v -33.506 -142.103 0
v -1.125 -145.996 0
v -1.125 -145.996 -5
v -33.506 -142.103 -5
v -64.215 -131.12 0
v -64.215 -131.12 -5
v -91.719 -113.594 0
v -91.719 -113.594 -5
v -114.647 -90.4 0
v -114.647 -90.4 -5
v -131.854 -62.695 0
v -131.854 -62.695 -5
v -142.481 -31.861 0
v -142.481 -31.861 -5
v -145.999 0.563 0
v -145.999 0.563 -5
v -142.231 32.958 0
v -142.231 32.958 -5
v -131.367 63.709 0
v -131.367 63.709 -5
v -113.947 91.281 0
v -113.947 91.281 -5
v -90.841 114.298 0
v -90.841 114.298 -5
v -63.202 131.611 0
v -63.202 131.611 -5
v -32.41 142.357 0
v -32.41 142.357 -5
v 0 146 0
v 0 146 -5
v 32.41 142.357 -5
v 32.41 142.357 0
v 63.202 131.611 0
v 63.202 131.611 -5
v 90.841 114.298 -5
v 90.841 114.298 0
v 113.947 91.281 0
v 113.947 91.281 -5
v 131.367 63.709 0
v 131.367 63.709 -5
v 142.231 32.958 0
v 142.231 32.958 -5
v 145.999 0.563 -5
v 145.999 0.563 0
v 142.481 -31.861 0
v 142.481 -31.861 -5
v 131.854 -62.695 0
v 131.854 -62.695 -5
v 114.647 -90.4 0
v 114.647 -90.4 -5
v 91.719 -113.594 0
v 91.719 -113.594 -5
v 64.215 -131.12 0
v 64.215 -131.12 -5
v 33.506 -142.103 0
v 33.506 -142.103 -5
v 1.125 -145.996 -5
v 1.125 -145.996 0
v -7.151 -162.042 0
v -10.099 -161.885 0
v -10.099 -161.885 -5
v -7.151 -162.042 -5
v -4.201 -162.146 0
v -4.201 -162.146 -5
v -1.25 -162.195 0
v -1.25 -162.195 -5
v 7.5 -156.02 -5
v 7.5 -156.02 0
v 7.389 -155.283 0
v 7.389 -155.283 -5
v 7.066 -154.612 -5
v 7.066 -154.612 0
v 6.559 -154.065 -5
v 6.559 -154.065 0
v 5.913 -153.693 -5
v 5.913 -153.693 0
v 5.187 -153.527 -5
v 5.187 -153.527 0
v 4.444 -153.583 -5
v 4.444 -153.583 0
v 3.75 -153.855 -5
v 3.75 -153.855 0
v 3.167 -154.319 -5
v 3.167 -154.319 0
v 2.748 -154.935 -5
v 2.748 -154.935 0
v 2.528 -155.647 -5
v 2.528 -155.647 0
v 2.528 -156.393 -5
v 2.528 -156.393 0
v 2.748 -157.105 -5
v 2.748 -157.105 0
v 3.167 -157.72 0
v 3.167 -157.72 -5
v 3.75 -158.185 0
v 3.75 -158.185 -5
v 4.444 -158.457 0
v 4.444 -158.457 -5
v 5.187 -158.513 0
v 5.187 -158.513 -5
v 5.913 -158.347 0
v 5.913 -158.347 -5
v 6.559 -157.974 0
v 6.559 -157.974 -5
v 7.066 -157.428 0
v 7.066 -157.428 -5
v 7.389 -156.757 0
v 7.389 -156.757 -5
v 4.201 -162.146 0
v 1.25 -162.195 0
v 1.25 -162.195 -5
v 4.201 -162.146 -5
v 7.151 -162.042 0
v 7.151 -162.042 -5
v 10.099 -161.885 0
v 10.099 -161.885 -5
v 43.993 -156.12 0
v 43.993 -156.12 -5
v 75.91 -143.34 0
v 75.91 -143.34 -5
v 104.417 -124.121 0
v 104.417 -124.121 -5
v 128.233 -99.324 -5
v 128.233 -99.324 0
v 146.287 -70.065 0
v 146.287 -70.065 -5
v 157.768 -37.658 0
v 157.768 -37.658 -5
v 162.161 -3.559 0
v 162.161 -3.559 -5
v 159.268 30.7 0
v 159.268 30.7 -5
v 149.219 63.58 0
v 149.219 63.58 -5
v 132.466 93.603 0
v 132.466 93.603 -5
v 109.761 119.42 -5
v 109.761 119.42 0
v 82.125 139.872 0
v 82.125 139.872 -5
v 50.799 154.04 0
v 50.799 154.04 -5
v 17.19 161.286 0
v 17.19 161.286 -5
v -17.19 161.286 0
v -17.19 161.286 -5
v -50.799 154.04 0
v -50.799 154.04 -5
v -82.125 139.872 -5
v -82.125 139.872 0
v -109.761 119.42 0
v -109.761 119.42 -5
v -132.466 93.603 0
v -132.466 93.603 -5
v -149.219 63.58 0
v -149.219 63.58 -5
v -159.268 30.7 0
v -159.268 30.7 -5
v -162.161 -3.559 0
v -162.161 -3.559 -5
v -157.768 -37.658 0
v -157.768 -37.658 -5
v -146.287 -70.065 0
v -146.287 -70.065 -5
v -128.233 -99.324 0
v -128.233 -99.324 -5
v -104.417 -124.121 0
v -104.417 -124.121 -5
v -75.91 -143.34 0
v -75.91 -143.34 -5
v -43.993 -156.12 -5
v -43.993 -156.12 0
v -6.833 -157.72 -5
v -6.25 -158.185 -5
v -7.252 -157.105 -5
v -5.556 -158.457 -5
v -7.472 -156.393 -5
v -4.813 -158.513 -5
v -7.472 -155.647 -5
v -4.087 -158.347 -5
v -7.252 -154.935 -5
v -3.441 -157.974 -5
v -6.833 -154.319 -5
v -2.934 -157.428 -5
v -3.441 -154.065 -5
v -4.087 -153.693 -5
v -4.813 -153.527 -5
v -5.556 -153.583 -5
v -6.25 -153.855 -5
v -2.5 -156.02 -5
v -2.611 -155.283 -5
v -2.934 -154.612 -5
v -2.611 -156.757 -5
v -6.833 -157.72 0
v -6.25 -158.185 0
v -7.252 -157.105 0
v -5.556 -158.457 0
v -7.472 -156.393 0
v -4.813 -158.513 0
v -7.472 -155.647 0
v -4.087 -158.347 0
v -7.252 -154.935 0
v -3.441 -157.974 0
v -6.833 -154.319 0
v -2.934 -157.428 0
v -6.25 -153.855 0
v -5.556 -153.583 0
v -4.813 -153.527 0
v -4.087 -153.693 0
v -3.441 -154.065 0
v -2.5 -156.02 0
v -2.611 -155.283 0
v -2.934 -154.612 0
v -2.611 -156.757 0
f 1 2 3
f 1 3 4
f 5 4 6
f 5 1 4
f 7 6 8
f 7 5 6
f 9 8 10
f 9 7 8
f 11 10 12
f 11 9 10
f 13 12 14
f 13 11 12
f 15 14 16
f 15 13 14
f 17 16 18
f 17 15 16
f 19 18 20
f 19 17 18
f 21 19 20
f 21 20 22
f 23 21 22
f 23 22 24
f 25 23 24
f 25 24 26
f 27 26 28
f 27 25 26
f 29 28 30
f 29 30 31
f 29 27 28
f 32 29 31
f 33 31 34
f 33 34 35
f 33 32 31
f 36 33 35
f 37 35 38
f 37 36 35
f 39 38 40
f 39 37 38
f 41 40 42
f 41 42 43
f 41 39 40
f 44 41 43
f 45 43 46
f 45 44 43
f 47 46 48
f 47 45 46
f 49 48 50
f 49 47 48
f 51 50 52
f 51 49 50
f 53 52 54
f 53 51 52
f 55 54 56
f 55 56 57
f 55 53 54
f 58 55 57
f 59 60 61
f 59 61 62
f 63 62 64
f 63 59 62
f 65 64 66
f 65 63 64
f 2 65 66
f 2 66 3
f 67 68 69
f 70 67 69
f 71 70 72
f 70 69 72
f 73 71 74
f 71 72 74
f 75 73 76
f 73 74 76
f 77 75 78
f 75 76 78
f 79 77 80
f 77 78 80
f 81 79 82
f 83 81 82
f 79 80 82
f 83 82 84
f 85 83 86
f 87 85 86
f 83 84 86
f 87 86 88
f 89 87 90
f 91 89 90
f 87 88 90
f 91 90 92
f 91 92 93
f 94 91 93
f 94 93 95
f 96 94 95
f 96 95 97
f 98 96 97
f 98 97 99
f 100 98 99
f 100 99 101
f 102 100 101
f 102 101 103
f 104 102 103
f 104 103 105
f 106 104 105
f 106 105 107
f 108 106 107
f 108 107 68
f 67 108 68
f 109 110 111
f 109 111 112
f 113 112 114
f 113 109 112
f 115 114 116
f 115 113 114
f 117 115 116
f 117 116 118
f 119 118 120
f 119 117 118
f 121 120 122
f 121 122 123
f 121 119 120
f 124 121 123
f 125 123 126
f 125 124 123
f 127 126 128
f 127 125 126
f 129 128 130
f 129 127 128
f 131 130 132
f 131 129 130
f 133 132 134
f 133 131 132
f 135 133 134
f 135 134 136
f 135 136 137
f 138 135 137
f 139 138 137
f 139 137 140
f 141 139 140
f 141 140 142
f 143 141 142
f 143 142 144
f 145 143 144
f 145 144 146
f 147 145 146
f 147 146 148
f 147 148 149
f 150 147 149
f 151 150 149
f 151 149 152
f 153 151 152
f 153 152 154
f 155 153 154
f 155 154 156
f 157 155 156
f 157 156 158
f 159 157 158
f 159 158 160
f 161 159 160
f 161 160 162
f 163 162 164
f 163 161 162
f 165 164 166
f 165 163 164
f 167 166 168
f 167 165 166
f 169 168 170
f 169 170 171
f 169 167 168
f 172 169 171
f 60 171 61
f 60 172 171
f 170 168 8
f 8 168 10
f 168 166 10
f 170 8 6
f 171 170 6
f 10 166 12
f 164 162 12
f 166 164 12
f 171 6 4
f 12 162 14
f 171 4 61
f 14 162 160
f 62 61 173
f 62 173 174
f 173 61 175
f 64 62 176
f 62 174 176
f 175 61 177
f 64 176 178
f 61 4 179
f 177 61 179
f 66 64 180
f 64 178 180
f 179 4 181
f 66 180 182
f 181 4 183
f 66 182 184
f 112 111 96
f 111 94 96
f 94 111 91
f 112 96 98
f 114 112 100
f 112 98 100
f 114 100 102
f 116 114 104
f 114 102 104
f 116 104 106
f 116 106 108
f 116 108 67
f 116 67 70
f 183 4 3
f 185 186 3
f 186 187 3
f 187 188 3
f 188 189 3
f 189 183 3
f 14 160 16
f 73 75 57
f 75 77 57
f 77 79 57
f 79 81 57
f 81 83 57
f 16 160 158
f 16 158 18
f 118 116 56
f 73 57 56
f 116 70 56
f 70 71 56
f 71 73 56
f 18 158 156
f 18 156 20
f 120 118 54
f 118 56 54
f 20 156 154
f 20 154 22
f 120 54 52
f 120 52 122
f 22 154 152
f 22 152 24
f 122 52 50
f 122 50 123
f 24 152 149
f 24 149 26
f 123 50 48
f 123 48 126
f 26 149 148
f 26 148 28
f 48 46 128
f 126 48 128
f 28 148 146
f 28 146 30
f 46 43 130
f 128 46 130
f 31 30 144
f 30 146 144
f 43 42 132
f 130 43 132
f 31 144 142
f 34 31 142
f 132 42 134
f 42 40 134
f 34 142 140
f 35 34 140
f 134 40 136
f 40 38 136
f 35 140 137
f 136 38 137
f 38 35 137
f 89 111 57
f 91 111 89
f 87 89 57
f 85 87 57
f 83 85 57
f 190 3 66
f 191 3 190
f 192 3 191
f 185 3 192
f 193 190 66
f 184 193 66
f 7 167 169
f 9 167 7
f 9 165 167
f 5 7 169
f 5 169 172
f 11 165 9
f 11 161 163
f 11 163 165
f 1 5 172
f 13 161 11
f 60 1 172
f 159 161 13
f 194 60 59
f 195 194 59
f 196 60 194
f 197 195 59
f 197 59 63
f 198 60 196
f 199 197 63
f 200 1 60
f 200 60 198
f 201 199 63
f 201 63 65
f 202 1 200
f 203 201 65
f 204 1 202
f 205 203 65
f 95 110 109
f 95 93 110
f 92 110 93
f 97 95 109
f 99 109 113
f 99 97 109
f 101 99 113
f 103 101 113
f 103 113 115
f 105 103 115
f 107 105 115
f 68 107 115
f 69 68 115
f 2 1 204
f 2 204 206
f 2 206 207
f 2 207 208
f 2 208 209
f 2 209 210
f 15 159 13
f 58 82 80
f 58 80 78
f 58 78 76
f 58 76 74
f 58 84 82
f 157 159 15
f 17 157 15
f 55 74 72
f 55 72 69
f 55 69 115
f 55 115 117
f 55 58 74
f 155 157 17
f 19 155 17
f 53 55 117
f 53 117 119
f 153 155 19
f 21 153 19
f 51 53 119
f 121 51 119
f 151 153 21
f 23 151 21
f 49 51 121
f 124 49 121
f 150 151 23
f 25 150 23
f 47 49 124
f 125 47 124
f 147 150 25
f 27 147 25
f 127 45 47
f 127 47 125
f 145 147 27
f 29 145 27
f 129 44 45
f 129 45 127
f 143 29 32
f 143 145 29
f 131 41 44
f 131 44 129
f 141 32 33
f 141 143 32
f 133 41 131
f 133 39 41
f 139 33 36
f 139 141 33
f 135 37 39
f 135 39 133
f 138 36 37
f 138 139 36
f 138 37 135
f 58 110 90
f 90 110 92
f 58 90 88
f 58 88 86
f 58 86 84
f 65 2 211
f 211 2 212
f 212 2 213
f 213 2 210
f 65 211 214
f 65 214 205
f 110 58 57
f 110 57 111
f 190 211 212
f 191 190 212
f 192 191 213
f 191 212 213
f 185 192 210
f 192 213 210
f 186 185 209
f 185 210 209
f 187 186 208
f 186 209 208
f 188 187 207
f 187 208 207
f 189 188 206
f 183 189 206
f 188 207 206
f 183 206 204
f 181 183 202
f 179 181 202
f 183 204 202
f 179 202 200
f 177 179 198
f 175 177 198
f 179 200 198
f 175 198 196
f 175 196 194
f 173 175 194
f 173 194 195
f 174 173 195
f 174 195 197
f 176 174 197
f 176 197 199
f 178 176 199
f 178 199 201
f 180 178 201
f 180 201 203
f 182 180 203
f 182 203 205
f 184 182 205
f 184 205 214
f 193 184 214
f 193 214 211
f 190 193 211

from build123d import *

# Parameters (mm, degrees)
BODYSKE_R   = 2.5
BODY_DEPTH  = 5
UNLUG_DEPTH = 5


with BuildPart() as part:
    # BodySke → Body (new body)
    with BuildSketch(Plane.XY):
        with BuildLine():
            Line((1.125154131, -145.995664416), (1.25, -162.195183344))
            ThreePointArc((1.25, -162.195183344), (5.676371918, -162.100644051), (10.098514589, -161.885329796))
            ThreePointArc((10.098514589, -161.885329796), (10.563651318, -161.684989651), (10.7954035, -161.23467945))
            Line((10.7954035, -161.23467945), (10.957598268, -160.002687876))
            ThreePointArc((10.957598268, -160.002687876), (13.335118636, -155.229150535), (18.145600866, -152.92729855))
            ThreePointArc((18.145600866, -152.92729855), (0, 162), (-18.145600866, -152.92729855))
            ThreePointArc((-18.145600866, -152.92729855), (-13.335118636, -155.229150535), (-10.957598268, -160.002687876))
            Line((-10.957598268, -160.002687876), (-10.7954035, -161.23467945))
            ThreePointArc((-10.7954035, -161.23467945), (-10.563651318, -161.684989651), (-10.098514589, -161.885329796))
            ThreePointArc((-10.098514589, -161.885329796), (-5.676371918, -162.100644051), (-1.25, -162.195183344))
            Line((-1.25, -162.195183344), (-1.125154131, -145.995664416))
            ThreePointArc((-1.125154131, -145.995664416), (0, 146), (1.125154131, -145.995664416))
        make_face()
        with Locations((5, -156.019902577)):
            Circle(BODYSKE_R, mode=Mode.SUBTRACT)
        with Locations((-5, -156.019902577)):
            Circle(BODYSKE_R, mode=Mode.SUBTRACT)
    extrude(amount=-BODY_DEPTH)

    # UnlSke → Unlug (add, through all)
    with BuildSketch(Plane.XY):
        with BuildLine():
            Line((-7.791082109, -162.01277431), (-7.012934574, -145.831473793))
            ThreePointArc((-7.012934574, -145.831473793), (0, 146), (7.012934574, -145.831473793))
            Line((7.012934574, -145.831473793), (7.791082109, -162.01277431))
            ThreePointArc((7.791082109, -162.01277431), (0, 162.2), (-7.791082109, -162.01277431))
        make_face()
    extrude(amount=-UNLUG_DEPTH)


solid = part.part
